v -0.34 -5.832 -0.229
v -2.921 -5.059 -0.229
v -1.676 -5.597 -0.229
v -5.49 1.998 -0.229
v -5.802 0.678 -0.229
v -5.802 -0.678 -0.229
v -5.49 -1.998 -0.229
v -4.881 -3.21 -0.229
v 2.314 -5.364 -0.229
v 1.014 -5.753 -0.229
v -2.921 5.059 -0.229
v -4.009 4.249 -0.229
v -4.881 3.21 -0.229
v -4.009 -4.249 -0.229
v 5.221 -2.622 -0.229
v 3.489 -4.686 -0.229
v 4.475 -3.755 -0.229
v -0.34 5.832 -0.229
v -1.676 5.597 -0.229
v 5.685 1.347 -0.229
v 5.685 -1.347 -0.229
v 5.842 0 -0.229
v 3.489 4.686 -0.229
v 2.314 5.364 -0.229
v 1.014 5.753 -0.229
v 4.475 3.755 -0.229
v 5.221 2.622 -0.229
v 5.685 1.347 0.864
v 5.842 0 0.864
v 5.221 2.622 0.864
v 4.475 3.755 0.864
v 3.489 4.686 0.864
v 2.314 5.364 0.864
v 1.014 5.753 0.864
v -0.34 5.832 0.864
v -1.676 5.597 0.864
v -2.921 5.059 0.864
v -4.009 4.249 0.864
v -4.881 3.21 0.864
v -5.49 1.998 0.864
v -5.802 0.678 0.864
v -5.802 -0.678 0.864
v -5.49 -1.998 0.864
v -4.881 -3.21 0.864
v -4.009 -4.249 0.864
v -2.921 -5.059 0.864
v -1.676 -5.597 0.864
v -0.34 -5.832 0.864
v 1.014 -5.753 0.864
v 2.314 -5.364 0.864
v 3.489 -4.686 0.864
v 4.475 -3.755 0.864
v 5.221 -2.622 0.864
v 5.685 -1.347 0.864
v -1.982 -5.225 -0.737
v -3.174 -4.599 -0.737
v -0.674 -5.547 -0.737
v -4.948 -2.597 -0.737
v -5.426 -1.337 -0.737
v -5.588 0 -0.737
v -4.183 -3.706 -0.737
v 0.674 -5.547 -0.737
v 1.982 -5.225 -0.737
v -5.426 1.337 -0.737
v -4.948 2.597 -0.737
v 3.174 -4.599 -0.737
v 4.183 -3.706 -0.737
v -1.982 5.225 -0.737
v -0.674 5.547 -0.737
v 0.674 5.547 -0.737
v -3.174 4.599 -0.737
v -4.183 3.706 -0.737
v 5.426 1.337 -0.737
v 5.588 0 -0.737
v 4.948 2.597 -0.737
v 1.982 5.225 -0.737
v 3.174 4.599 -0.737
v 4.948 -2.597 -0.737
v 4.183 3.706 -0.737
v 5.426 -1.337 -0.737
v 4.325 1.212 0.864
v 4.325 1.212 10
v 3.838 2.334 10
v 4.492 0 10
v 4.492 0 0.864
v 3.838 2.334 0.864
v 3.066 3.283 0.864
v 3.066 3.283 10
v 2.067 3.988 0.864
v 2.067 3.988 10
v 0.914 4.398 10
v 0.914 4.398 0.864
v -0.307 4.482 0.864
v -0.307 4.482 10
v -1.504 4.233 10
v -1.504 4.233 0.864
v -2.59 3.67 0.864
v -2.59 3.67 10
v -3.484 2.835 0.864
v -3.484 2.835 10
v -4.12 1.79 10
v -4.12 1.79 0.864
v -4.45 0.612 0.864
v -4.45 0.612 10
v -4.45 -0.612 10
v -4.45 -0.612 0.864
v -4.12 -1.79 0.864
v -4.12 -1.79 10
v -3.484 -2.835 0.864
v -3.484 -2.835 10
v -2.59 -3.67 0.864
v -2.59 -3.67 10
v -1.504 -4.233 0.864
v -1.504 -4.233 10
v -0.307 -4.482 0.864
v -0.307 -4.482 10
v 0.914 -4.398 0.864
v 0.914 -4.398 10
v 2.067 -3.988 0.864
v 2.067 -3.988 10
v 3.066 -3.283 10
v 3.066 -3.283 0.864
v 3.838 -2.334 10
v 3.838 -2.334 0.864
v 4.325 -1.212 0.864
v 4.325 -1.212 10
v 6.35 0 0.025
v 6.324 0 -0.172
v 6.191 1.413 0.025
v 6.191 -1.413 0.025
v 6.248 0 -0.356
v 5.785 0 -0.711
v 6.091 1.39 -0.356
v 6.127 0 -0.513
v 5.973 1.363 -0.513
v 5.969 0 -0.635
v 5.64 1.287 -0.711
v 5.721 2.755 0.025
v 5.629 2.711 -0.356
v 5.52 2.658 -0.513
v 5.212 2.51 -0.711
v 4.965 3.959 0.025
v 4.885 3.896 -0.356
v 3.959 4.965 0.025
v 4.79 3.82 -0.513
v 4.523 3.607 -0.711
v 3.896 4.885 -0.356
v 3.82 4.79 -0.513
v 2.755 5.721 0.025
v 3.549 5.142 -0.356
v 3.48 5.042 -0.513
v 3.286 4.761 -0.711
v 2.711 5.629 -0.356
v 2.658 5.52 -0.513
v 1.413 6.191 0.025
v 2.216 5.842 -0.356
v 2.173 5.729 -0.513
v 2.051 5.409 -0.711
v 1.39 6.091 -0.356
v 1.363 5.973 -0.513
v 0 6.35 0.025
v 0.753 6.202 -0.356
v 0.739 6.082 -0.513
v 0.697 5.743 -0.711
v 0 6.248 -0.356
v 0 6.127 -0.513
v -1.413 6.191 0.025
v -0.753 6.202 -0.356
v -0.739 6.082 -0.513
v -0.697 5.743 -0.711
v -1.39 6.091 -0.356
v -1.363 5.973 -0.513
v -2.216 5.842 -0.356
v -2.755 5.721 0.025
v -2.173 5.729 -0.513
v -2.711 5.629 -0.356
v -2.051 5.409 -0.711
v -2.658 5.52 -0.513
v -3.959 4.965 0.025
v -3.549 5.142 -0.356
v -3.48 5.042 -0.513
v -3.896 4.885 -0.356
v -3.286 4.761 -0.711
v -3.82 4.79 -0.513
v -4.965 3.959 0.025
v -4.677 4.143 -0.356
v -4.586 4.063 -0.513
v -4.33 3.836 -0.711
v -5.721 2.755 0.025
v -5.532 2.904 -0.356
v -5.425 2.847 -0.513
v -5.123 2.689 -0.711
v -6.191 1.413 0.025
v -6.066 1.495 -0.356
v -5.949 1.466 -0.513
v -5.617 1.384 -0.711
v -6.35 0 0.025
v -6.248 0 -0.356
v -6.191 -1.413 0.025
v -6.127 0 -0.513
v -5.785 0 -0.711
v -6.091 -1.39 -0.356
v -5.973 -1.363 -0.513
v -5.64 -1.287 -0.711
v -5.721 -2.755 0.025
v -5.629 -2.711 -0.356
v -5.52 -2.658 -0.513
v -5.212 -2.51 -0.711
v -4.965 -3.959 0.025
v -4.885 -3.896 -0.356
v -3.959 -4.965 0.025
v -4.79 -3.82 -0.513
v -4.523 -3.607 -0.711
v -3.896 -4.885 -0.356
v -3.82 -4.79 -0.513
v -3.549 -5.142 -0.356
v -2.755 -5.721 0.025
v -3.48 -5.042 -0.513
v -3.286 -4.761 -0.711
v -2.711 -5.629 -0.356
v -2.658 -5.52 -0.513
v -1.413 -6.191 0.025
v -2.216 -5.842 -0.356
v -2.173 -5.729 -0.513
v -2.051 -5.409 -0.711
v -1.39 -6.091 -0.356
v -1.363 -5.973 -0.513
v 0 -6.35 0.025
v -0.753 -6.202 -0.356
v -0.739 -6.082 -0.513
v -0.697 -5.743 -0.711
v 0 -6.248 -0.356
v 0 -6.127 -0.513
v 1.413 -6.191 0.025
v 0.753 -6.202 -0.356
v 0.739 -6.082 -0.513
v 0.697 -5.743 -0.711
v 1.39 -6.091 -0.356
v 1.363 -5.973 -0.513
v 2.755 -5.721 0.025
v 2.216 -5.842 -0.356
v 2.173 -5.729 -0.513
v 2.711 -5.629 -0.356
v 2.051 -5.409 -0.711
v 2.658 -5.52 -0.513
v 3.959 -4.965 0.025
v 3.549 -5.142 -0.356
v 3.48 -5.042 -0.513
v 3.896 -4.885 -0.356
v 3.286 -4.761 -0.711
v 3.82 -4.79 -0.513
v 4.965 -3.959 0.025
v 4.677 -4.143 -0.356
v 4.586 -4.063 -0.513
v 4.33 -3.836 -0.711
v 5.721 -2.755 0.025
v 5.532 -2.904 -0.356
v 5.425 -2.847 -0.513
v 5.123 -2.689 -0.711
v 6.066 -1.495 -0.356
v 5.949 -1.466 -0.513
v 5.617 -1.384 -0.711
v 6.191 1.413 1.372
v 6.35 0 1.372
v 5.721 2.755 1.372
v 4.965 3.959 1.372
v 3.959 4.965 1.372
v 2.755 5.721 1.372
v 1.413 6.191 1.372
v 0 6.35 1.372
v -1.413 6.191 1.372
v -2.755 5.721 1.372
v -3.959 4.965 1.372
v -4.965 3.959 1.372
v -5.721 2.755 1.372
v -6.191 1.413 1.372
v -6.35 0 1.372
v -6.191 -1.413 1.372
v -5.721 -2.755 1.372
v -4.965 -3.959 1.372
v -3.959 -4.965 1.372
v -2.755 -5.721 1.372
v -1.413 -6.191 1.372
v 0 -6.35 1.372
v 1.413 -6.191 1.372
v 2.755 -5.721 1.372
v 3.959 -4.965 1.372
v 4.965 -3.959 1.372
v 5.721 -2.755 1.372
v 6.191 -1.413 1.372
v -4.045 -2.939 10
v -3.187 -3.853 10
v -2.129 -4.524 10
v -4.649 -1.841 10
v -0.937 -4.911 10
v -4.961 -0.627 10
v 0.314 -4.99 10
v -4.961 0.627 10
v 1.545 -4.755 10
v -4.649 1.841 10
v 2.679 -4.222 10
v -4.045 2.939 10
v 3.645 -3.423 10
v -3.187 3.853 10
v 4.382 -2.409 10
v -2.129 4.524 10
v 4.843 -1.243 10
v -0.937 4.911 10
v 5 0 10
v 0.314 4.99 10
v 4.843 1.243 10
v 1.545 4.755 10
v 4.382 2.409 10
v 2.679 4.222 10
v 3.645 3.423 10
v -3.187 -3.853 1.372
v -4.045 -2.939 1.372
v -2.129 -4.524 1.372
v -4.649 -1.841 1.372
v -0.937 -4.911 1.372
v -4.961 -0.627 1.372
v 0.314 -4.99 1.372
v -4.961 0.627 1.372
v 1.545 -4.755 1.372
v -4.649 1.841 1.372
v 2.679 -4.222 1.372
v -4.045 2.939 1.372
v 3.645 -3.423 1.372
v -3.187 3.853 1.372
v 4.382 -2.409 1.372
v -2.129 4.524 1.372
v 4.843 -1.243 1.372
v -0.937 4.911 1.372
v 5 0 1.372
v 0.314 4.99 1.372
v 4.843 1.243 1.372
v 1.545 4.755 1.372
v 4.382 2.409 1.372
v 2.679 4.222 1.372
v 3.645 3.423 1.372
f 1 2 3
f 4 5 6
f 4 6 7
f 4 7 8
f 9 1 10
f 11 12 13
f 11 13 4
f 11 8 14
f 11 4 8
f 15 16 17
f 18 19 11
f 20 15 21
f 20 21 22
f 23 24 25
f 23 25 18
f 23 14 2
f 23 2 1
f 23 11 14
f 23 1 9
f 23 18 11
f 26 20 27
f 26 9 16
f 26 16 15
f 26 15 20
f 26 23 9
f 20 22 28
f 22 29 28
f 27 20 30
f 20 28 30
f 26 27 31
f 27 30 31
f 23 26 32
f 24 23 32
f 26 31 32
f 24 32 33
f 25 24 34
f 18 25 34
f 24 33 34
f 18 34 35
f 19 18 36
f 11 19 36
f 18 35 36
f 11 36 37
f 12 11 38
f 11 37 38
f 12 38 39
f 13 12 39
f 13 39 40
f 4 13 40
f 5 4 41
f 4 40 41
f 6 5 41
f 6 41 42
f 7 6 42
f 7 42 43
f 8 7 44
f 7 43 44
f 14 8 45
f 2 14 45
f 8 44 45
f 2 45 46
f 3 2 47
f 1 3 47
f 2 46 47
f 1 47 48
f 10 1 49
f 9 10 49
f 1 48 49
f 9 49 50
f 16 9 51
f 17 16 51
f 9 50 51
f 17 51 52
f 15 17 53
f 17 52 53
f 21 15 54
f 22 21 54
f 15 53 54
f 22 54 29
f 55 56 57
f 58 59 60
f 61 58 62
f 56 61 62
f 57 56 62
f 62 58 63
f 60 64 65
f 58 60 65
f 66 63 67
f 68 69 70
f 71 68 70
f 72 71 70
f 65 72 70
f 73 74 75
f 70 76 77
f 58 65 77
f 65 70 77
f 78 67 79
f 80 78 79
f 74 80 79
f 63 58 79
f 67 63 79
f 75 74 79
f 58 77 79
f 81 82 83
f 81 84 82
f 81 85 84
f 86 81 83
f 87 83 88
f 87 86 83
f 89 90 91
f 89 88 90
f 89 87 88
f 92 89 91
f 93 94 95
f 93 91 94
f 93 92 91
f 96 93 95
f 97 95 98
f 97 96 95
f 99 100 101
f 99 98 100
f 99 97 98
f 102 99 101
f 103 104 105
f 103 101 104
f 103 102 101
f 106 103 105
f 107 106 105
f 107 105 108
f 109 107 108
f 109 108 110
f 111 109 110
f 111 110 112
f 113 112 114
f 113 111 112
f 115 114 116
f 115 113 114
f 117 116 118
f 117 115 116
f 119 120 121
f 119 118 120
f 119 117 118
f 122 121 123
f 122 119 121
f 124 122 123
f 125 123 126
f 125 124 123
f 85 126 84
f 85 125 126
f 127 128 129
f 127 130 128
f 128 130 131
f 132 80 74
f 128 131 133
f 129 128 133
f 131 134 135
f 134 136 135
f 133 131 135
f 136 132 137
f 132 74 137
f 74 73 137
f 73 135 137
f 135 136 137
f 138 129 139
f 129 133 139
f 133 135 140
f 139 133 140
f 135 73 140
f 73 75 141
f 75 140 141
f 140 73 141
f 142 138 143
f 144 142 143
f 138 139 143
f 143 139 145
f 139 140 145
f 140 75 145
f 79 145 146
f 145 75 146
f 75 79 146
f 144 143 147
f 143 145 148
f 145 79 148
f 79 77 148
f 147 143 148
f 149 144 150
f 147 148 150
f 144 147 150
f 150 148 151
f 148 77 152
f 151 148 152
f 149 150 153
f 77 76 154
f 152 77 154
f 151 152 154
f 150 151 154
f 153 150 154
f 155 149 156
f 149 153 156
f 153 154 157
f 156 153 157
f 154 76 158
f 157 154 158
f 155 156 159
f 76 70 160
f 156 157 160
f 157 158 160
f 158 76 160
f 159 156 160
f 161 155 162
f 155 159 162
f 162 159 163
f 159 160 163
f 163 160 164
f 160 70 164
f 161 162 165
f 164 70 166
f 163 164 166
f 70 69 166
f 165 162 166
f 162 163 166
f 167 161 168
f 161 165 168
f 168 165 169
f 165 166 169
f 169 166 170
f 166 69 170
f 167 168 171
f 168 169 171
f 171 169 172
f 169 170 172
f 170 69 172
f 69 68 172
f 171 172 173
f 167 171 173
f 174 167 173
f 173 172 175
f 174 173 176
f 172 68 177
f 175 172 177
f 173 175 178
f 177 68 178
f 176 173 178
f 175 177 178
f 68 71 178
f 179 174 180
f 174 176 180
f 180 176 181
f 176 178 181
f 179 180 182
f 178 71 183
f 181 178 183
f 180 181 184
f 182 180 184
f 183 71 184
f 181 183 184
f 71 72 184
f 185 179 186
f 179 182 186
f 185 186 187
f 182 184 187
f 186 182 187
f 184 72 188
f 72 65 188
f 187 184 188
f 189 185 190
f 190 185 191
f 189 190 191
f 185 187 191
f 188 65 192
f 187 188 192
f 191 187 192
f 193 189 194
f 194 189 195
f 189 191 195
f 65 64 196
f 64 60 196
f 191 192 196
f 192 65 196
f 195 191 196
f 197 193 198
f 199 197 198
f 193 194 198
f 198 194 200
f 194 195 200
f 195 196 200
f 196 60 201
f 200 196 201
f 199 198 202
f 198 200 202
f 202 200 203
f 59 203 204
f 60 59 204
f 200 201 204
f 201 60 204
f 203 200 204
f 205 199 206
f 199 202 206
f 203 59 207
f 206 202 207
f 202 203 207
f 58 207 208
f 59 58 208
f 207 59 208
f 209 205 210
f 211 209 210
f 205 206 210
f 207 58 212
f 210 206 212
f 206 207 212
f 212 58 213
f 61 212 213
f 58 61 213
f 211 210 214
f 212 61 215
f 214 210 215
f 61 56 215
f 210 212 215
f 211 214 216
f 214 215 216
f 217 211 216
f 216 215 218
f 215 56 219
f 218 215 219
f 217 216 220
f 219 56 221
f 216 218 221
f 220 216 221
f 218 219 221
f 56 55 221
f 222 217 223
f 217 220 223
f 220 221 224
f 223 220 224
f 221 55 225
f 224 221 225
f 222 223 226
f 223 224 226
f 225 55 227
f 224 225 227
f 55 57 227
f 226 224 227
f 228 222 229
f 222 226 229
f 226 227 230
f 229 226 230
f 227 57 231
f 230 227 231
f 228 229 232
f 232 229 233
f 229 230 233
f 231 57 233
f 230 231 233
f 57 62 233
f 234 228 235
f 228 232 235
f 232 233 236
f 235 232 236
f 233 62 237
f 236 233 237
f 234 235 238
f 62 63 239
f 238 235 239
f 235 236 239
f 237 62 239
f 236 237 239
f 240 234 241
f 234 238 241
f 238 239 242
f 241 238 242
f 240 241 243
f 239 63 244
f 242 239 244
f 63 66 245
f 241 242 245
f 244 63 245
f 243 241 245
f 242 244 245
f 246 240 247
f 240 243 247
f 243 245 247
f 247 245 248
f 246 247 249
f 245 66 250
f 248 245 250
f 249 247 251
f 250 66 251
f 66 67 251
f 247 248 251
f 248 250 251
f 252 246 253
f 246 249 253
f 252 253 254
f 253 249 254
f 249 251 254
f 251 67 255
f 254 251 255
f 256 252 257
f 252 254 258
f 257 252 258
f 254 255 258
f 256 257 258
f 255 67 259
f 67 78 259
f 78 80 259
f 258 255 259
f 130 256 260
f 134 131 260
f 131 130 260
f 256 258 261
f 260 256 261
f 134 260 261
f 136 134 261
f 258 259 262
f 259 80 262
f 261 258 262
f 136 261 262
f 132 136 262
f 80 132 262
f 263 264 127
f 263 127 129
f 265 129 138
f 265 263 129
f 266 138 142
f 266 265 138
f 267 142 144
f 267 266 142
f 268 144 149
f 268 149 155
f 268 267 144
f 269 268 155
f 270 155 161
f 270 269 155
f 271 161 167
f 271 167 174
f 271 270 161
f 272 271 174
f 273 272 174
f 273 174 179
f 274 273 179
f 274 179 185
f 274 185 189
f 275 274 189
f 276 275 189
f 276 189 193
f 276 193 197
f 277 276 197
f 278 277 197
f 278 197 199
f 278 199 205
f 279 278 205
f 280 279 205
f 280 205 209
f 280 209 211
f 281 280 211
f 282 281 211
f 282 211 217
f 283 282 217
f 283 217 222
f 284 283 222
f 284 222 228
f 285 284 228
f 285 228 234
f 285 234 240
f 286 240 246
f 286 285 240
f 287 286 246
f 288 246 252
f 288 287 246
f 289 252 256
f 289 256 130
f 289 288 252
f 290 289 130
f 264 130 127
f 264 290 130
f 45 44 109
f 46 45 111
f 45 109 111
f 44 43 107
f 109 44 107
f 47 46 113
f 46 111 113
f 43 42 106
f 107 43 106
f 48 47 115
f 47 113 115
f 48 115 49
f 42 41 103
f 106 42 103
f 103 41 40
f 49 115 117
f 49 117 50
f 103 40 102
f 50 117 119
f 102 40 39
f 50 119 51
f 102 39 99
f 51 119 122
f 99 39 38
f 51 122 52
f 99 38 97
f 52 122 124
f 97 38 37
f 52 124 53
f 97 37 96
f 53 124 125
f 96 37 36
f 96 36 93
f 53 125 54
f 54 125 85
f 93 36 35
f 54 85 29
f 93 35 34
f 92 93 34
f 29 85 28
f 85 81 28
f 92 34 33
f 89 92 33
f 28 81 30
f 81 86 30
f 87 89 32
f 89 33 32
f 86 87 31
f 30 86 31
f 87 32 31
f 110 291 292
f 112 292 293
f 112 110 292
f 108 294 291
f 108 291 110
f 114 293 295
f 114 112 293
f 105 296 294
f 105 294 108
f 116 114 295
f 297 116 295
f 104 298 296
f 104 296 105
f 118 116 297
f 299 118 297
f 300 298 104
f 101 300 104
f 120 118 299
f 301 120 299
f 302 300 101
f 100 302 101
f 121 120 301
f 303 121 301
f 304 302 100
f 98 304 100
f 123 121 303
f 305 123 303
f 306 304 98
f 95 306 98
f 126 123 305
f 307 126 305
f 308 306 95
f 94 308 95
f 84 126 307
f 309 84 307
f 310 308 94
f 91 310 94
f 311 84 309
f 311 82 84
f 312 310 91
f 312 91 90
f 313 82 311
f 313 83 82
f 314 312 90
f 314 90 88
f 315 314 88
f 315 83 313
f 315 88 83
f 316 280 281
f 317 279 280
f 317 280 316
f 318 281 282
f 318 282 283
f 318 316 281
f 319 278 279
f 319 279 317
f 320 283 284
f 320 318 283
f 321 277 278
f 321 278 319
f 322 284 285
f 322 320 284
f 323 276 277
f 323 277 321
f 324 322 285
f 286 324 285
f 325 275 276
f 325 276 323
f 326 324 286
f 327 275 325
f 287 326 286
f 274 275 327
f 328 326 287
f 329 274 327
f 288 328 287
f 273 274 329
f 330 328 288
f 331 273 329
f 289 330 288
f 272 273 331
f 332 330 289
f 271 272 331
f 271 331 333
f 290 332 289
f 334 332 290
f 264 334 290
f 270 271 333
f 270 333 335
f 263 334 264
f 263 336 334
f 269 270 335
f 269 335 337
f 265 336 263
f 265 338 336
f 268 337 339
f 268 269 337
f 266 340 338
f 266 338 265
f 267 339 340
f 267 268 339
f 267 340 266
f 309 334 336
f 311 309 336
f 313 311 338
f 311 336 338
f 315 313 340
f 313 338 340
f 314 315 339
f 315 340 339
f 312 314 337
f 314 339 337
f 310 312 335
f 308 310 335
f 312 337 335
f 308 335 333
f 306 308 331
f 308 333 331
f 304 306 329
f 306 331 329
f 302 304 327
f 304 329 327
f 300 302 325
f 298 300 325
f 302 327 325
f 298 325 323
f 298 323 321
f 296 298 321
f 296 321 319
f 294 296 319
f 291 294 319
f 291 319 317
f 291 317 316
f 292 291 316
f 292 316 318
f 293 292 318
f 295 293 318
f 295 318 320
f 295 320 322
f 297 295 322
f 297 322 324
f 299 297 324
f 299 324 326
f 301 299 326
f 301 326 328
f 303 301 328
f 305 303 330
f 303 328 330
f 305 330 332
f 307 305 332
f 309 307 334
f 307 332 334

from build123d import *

# Parameters (mm, degrees)
F0_R          = 5
F1_DEPTH      = 10
F0_R_2        = 6.35
F2_DEPTH      = 1.3716
F2_DEPTH_BACK = 0.7366
F3_T          = -0.508
F4_R          = 0.762


with BuildPart() as f1:
    # F0 (on Top) → F1 (new body)
    with BuildSketch(Plane.XY):
        Circle(F0_R)
    extrude(amount=F1_DEPTH)

    # F0 (on Top) → F2 (join, two sides)
    with BuildSketch(Plane.XY) as f2_sk:
        Circle(F0_R_2)
        Circle(F0_R, mode=Mode.SUBTRACT)
        Circle(F0_R)
    extrude(amount=F2_DEPTH)
    extrude(f2_sk.sketch, amount=-F2_DEPTH_BACK)

    # F3
    f3_openings = [f1.faces().sort_by_distance(p)[0] for p in [
        (0, 0, 10),
    ]]
    offset(amount=F3_T, openings=f3_openings, kind=Kind.INTERSECTION)

    # F4
    f4_edges = [f1.edges().sort_by_distance(p)[0] for p in [
        (-6.35, 0, -0.7366),
    ]]
    fillet(f4_edges, radius=F4_R)


solid = f1.part
